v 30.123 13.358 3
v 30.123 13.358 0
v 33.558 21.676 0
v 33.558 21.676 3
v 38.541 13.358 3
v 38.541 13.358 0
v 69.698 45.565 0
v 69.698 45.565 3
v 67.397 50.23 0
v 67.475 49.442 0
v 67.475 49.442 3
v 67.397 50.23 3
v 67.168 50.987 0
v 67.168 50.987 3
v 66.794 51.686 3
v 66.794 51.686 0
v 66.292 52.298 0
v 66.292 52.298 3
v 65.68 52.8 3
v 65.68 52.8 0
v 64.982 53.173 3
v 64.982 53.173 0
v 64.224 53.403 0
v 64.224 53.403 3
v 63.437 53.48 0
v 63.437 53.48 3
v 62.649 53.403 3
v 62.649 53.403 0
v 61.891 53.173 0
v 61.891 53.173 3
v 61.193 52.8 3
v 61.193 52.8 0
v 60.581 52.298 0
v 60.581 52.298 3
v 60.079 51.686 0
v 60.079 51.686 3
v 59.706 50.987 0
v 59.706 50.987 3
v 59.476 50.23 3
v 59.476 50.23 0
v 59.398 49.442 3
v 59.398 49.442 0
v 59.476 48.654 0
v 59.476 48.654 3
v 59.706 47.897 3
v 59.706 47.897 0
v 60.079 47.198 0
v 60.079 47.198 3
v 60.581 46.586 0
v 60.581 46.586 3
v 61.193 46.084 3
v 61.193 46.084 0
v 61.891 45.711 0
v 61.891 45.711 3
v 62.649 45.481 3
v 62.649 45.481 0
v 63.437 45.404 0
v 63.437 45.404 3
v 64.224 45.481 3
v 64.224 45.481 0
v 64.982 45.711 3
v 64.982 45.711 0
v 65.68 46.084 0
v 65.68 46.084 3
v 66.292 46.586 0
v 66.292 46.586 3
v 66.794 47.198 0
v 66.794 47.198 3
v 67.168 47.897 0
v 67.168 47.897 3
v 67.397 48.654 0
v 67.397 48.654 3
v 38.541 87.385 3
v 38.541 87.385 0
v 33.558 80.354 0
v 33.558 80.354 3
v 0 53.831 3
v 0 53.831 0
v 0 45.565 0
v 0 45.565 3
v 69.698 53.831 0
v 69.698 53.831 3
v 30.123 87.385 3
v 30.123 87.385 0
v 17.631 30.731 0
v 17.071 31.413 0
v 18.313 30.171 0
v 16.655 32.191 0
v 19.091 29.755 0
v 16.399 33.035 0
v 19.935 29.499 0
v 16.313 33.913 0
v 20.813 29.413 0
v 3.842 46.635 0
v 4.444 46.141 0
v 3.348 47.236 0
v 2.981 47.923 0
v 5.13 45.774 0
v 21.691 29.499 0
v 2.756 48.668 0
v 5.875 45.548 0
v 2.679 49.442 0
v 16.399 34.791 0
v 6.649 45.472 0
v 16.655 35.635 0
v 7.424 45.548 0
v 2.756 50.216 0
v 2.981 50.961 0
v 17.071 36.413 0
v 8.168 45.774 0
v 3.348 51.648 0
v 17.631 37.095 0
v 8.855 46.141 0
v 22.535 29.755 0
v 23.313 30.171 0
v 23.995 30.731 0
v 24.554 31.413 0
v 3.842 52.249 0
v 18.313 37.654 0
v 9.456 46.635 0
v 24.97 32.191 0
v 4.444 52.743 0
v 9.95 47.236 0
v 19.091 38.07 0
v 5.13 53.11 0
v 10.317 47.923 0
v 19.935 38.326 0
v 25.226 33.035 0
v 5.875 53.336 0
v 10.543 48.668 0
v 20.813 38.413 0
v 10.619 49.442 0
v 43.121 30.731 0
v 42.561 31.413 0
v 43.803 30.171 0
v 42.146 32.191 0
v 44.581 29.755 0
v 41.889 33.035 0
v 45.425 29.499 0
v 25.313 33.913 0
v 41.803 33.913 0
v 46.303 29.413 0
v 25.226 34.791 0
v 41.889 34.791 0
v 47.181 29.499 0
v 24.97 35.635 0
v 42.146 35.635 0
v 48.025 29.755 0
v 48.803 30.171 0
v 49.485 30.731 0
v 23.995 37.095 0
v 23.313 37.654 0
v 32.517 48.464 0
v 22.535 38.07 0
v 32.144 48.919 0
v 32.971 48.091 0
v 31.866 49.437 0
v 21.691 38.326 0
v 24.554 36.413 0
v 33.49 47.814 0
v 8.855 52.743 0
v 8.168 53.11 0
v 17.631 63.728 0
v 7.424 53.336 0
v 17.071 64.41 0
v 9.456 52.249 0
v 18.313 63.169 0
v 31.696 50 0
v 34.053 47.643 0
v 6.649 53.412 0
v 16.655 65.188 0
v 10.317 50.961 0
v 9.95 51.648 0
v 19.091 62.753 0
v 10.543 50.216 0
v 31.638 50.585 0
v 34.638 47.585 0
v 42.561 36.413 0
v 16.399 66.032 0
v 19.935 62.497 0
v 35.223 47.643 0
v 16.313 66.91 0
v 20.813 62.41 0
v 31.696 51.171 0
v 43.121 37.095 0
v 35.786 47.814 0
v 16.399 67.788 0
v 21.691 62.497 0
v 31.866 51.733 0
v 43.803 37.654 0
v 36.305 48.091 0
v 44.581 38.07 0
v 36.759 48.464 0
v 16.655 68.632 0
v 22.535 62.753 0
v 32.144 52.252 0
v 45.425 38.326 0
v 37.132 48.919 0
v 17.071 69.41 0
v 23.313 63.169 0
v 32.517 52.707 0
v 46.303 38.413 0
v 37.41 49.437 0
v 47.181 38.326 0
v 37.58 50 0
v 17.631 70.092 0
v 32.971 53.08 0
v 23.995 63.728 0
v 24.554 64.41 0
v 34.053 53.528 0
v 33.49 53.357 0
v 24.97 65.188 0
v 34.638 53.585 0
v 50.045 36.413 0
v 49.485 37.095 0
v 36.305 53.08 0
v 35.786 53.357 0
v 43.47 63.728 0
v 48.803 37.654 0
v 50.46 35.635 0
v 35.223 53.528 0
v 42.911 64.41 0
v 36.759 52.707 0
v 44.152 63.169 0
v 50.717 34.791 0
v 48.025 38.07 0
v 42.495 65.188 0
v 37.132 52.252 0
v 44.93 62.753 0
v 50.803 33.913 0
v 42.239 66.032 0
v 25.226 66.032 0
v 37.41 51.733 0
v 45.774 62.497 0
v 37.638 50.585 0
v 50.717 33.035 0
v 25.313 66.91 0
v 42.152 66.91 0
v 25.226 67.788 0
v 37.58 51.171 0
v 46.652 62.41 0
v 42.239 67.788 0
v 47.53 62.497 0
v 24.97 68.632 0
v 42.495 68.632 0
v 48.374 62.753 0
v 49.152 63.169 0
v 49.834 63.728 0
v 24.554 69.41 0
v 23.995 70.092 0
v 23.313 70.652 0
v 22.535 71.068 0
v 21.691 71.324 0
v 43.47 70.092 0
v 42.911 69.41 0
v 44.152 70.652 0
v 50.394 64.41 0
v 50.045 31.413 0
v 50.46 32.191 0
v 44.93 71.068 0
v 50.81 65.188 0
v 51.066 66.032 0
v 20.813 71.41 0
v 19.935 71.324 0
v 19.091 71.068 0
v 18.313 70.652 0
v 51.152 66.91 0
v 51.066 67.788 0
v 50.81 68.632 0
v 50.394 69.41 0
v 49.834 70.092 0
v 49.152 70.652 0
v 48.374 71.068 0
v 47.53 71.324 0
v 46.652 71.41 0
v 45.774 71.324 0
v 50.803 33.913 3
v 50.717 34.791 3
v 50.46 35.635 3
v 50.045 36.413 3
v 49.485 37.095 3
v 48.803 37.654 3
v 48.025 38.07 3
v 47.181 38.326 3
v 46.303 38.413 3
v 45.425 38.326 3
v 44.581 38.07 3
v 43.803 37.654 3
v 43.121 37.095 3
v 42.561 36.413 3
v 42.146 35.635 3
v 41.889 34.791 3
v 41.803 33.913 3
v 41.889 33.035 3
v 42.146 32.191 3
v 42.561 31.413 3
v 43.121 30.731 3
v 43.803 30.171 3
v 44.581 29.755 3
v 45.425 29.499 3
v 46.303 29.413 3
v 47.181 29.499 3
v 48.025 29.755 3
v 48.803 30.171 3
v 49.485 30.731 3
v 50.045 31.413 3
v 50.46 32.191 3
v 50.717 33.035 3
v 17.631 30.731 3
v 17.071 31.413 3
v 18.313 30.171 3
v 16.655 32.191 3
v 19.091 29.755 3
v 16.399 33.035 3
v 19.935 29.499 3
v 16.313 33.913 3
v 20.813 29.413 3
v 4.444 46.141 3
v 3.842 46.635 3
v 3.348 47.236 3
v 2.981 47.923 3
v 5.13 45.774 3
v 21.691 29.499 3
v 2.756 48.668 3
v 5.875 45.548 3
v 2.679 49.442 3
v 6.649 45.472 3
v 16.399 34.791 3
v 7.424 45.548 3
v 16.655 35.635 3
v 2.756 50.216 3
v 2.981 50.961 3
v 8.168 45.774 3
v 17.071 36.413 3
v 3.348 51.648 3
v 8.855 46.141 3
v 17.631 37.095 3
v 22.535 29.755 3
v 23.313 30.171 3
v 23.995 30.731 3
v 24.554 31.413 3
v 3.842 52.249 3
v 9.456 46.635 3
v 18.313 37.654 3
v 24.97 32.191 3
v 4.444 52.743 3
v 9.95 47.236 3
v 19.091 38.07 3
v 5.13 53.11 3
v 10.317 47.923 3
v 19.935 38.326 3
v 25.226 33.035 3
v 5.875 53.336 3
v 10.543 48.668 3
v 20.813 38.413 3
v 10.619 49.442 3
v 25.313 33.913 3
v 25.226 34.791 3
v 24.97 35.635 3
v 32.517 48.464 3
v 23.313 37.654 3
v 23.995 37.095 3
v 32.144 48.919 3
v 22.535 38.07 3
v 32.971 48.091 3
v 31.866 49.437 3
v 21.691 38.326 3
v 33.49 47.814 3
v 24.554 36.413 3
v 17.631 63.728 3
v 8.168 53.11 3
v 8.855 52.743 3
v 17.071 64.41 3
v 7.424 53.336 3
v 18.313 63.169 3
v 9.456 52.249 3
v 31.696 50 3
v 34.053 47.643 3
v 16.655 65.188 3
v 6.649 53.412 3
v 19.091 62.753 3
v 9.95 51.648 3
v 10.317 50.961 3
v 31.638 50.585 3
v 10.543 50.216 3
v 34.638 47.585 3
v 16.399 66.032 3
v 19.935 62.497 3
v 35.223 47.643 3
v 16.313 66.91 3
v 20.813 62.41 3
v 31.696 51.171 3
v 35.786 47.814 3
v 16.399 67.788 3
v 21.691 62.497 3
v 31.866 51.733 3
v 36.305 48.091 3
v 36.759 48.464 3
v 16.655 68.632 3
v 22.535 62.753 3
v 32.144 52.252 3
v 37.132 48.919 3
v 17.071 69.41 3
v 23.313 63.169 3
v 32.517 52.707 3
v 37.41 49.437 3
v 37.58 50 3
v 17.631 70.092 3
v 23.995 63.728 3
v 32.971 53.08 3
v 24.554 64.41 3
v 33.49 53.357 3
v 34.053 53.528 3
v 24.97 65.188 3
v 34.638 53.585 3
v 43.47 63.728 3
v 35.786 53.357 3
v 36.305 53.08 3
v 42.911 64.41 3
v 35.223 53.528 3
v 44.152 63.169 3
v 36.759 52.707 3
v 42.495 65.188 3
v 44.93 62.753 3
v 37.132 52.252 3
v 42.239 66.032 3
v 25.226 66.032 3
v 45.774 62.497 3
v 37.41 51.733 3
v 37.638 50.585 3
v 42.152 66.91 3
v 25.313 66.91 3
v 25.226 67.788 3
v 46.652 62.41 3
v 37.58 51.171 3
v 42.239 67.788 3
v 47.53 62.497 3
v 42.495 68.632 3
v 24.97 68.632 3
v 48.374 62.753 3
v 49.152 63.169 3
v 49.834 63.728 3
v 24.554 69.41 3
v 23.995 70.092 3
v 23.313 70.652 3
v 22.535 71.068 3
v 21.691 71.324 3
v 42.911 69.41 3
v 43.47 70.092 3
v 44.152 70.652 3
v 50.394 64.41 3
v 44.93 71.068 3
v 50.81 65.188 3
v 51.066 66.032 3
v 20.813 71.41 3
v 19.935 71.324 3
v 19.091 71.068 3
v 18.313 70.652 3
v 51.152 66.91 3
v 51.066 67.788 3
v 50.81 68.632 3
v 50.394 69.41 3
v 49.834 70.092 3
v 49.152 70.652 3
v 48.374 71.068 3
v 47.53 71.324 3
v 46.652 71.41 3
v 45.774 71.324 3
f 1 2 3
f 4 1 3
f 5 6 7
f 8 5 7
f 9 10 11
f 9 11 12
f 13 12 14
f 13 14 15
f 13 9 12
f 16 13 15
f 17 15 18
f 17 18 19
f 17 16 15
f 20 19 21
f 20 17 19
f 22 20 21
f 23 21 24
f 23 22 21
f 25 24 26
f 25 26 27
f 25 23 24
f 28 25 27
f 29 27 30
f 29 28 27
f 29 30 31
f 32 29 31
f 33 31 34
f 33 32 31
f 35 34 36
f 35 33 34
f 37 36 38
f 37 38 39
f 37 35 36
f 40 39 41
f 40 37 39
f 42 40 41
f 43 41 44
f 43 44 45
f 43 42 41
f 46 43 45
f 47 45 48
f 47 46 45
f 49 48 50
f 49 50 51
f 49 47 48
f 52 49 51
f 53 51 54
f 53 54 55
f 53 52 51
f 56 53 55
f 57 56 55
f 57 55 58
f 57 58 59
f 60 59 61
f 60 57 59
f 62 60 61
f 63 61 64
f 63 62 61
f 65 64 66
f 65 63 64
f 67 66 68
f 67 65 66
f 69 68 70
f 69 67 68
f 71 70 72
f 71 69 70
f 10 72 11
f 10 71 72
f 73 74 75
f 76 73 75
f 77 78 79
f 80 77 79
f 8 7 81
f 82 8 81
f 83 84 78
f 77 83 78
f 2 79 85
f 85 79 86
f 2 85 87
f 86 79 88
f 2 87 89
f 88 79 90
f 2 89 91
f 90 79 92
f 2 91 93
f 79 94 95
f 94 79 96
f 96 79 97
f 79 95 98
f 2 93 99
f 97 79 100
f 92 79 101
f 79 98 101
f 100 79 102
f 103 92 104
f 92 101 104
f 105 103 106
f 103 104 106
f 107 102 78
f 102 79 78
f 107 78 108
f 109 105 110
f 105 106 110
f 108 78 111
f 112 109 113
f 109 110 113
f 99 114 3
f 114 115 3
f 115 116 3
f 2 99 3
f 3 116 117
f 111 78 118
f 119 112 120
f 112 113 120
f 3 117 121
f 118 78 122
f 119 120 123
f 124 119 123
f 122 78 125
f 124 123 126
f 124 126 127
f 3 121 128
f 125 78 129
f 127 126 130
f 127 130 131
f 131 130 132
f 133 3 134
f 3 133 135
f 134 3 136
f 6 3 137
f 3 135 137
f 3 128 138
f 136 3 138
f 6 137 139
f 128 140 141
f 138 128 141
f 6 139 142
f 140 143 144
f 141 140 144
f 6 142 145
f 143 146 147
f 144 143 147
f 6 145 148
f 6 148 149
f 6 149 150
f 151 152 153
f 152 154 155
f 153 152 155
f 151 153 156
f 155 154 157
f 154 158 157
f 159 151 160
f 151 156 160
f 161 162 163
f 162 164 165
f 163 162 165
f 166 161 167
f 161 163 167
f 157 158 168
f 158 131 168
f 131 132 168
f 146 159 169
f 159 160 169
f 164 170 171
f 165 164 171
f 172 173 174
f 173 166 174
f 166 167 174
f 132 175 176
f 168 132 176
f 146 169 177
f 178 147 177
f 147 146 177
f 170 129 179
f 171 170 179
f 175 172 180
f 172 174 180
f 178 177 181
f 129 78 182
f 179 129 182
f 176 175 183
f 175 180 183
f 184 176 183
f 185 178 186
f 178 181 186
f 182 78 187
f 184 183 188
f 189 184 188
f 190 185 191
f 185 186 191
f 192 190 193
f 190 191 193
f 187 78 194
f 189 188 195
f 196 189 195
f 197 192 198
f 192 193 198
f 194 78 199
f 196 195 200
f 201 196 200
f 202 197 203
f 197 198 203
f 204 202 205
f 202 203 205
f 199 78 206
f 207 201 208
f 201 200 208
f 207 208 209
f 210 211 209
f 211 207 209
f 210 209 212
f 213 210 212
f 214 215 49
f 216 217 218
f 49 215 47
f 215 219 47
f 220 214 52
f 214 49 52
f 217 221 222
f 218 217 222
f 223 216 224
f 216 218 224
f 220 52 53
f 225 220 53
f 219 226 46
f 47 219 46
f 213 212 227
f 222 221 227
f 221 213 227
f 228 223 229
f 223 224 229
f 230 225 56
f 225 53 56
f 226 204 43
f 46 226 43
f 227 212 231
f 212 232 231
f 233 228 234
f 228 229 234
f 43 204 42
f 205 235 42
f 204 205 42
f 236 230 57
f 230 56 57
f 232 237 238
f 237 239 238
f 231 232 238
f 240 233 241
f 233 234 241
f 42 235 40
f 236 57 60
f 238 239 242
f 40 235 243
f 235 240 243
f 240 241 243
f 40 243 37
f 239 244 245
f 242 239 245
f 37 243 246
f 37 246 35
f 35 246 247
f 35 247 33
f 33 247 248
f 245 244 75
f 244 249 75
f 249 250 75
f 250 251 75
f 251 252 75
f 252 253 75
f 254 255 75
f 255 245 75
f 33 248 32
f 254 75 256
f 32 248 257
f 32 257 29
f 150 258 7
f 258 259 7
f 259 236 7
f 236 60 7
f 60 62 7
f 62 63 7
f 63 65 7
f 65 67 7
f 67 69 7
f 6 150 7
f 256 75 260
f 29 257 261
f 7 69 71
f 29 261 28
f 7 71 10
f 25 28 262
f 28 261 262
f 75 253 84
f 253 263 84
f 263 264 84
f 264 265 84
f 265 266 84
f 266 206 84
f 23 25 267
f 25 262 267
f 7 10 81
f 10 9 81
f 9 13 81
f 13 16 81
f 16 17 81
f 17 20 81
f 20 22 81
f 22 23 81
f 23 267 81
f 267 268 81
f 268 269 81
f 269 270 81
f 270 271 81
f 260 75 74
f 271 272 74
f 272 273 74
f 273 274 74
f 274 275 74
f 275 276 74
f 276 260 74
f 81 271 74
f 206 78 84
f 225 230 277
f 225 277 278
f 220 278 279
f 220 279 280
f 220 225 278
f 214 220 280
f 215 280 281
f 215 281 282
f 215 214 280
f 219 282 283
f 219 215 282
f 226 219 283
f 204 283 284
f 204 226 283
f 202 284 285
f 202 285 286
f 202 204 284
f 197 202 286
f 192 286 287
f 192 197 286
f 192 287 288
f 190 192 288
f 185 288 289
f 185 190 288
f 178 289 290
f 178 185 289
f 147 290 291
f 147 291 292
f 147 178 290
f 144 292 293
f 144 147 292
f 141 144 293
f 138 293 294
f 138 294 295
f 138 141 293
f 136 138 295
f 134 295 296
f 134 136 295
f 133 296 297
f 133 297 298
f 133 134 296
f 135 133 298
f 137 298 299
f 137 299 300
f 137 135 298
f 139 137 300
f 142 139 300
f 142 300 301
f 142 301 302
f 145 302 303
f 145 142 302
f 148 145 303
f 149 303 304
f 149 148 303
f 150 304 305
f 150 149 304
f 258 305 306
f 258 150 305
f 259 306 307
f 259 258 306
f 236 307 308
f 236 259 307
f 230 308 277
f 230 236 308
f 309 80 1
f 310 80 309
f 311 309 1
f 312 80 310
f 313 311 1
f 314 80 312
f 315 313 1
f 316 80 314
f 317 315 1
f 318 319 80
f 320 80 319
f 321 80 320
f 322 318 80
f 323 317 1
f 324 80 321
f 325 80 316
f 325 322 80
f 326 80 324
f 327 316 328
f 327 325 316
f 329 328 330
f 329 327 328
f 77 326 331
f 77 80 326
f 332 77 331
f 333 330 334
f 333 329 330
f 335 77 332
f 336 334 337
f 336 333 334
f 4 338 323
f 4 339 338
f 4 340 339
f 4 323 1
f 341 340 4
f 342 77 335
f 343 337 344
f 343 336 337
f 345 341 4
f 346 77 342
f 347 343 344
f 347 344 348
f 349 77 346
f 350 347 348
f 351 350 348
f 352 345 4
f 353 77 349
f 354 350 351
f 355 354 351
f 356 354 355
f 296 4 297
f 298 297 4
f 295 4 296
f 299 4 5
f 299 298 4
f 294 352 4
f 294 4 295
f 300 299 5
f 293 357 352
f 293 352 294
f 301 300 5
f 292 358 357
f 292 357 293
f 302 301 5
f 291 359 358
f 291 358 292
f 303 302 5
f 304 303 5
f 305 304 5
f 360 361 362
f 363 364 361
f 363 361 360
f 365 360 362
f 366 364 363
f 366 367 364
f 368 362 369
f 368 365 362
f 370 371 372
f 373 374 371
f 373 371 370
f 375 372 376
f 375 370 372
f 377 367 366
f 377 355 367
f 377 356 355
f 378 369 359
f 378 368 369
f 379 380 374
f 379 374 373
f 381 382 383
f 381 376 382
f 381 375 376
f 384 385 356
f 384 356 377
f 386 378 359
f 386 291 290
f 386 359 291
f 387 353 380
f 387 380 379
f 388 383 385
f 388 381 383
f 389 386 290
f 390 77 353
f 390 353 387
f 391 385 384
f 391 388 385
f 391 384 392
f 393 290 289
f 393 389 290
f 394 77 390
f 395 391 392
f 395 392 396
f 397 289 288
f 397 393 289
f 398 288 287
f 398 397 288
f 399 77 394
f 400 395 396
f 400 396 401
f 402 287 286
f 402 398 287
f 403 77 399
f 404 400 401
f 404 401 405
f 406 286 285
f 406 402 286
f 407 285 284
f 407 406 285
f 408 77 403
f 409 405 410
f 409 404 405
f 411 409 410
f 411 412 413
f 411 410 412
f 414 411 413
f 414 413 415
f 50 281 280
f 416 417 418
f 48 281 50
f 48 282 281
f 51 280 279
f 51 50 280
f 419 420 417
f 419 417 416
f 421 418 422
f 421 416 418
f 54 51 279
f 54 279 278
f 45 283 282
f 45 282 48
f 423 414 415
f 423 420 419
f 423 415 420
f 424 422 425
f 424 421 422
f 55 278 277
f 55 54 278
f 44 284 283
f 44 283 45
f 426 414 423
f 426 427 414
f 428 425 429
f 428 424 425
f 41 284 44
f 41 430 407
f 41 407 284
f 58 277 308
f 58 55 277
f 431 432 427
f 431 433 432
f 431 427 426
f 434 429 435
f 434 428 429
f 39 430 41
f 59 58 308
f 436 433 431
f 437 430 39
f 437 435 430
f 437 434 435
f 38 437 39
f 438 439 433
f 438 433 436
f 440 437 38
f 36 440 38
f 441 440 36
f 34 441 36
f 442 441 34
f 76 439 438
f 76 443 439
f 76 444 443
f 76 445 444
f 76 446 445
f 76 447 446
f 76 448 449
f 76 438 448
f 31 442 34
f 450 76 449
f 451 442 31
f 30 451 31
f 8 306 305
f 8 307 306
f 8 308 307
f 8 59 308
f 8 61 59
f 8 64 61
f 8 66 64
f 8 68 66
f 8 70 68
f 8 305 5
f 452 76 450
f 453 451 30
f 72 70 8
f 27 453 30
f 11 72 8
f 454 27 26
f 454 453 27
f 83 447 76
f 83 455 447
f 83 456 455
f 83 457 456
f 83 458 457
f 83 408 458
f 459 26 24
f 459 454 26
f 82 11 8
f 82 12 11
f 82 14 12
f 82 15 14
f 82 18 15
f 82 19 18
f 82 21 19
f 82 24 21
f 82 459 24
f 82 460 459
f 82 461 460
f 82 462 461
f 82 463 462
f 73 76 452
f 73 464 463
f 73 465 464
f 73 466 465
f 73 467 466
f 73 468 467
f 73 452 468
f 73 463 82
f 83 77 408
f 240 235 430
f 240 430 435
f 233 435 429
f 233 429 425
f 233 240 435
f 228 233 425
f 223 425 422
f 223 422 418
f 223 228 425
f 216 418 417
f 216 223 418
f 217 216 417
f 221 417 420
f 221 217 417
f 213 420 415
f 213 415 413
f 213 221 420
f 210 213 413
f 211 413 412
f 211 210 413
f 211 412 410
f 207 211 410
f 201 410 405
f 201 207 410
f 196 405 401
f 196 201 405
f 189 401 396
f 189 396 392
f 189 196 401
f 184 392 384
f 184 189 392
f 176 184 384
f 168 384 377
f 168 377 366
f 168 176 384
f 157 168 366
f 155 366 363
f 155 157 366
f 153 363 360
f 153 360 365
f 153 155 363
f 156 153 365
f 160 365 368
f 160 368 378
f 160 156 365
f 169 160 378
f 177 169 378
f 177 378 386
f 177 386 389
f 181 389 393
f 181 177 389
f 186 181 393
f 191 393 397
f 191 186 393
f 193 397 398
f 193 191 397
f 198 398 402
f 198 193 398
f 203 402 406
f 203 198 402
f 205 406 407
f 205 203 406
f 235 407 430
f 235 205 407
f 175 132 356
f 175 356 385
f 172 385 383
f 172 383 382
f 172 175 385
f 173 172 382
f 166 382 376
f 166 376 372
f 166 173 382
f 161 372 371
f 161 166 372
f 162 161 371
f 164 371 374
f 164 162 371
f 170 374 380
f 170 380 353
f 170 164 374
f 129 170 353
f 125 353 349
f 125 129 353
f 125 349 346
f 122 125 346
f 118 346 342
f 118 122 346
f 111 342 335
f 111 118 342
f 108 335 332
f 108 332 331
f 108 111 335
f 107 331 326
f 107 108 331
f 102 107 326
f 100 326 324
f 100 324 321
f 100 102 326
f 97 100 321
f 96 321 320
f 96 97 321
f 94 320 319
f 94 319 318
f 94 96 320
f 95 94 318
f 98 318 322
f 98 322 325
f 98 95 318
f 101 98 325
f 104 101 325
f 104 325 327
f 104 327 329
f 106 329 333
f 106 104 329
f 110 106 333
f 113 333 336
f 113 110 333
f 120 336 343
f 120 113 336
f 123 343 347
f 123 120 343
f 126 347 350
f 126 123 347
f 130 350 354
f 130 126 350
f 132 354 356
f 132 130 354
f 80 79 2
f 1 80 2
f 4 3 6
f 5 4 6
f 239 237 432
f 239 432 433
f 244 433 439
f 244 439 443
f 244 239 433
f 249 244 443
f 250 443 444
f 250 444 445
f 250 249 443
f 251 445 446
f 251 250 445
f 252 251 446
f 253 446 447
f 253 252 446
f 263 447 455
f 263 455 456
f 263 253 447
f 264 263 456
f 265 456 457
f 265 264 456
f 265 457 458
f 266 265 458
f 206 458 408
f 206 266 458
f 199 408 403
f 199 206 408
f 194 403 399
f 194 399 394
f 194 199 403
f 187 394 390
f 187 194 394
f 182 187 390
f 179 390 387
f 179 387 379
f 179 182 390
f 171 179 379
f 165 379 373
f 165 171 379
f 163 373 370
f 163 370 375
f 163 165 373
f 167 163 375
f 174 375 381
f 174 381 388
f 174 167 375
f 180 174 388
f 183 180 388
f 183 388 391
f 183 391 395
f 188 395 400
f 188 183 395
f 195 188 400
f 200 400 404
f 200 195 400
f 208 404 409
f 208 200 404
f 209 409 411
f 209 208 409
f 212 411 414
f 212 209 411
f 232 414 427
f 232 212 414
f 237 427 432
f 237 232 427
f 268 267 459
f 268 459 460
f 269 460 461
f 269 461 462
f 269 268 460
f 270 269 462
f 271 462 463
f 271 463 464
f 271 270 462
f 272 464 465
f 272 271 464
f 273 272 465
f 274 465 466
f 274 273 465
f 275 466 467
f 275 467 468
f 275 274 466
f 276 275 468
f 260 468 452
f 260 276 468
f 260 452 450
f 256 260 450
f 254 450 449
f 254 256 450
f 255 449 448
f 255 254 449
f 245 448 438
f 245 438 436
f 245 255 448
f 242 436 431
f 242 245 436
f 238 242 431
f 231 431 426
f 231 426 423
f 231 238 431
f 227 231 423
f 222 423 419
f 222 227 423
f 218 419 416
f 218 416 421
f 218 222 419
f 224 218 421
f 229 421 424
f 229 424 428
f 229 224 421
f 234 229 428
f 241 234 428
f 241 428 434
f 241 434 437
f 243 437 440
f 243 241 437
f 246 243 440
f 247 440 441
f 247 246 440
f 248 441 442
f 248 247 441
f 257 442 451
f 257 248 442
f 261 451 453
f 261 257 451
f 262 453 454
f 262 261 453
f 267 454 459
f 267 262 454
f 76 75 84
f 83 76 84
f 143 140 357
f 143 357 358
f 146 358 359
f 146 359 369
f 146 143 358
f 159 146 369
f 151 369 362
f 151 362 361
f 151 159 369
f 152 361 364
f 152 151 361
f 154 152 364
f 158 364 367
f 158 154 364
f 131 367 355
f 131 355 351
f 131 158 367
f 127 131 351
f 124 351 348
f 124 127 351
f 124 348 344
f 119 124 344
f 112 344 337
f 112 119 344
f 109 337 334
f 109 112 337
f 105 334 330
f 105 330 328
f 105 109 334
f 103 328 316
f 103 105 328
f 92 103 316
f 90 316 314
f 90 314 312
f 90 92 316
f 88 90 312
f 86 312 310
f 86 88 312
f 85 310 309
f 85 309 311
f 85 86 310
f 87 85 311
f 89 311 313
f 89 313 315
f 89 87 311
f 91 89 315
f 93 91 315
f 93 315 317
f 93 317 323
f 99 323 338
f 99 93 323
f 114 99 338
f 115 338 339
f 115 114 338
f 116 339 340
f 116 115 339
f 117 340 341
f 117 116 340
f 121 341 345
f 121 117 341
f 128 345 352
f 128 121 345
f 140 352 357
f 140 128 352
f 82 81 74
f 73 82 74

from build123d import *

# Parameters (mm, degrees)
F0_R     = 4.5
F0_R_2   = 3.9698540575
F1_DEPTH = 3
F0_W     = 8.4173739762
F0_H     = 21.1992750527
F0_R_3   = 3
F2_DEPTH = 3
F0_R_4   = 4.0384082605
F3_DEPTH = 3


with BuildPart() as f1:
    # F0 (on Top) → F1 (new body)
    with BuildSketch(Plane.XY):
        Polygon((0, 45.5646959671), (30.1232379104, 13.3580023242), (30.1232379104, 39.4406561247), align=None)
        with Locations((20.812695846, 33.9126698673)):
            Circle(F0_R, mode=Mode.SUBTRACT)
        Polygon((0, 45.5646959671), (30.1232379104, 39.4406561247), (30.1232379104, 60.6399311774), (0, 53.8307130337), align=None)
        with Locations((6.6491481848, 49.4420155883)):
            Circle(F0_R_2, mode=Mode.SUBTRACT)
        Polygon((0, 53.8307130337), (30.1232379104, 60.6399311774), (30.1232379104, 87.3854537311), align=None)
        with Locations((20.812695846, 66.9103562832)):
            Circle(F0_R, mode=Mode.SUBTRACT)
    extrude(amount=F1_DEPTH)

    # F0 (on Top) → F2 (join)
    with BuildSketch(Plane.XY):
        Polygon((30.1232379104, 87.3854537311), (30.1232379104, 60.6399311774), (38.5406118866, 60.6399311774), (38.5406118866, 87.3854537311), (33.5578359663, 80.3538560867), align=None)
        with Locations((34.3319248985, 50.0402936511)):
            Rectangle(F0_W, F0_H)
        with Locations((34.6380185767, 50.585233695)):
            Circle(F0_R_3, mode=Mode.SUBTRACT)
        Polygon((30.1232379104, 39.4406561247), (30.1232379104, 13.3580023242), (33.5578359663, 21.6755278666), (38.5406118866, 13.3580023242), (38.5406118866, 39.4406561247), align=None)
    extrude(amount=F2_DEPTH)

    # F0 (on Top) → F3 (join)
    with BuildSketch(Plane.XY):
        Polygon((38.5406118866, 39.4406561247), (38.5406118866, 13.3580023242), (69.6981623769, 45.5646959671), align=None)
        with Locations((46.3029742241, 33.9126698673)):
            Circle(F0_R, mode=Mode.SUBTRACT)
        Polygon((38.5406118866, 87.3854537311), (38.5406118866, 60.6399311774), (69.6981623769, 53.8307130337), align=None)
        with Locations((46.6521531343, 66.9103562832)):
            Circle(F0_R, mode=Mode.SUBTRACT)
        Polygon((38.5406118866, 60.6399311774), (38.5406118866, 39.4406561247), (69.6981623769, 45.5646959671), (69.6981623769, 53.8307130337), align=None)
        with Locations((63.4365081787, 49.4420155883)):
            Circle(F0_R_4, mode=Mode.SUBTRACT)
    extrude(amount=F3_DEPTH)


solid = f1.part
